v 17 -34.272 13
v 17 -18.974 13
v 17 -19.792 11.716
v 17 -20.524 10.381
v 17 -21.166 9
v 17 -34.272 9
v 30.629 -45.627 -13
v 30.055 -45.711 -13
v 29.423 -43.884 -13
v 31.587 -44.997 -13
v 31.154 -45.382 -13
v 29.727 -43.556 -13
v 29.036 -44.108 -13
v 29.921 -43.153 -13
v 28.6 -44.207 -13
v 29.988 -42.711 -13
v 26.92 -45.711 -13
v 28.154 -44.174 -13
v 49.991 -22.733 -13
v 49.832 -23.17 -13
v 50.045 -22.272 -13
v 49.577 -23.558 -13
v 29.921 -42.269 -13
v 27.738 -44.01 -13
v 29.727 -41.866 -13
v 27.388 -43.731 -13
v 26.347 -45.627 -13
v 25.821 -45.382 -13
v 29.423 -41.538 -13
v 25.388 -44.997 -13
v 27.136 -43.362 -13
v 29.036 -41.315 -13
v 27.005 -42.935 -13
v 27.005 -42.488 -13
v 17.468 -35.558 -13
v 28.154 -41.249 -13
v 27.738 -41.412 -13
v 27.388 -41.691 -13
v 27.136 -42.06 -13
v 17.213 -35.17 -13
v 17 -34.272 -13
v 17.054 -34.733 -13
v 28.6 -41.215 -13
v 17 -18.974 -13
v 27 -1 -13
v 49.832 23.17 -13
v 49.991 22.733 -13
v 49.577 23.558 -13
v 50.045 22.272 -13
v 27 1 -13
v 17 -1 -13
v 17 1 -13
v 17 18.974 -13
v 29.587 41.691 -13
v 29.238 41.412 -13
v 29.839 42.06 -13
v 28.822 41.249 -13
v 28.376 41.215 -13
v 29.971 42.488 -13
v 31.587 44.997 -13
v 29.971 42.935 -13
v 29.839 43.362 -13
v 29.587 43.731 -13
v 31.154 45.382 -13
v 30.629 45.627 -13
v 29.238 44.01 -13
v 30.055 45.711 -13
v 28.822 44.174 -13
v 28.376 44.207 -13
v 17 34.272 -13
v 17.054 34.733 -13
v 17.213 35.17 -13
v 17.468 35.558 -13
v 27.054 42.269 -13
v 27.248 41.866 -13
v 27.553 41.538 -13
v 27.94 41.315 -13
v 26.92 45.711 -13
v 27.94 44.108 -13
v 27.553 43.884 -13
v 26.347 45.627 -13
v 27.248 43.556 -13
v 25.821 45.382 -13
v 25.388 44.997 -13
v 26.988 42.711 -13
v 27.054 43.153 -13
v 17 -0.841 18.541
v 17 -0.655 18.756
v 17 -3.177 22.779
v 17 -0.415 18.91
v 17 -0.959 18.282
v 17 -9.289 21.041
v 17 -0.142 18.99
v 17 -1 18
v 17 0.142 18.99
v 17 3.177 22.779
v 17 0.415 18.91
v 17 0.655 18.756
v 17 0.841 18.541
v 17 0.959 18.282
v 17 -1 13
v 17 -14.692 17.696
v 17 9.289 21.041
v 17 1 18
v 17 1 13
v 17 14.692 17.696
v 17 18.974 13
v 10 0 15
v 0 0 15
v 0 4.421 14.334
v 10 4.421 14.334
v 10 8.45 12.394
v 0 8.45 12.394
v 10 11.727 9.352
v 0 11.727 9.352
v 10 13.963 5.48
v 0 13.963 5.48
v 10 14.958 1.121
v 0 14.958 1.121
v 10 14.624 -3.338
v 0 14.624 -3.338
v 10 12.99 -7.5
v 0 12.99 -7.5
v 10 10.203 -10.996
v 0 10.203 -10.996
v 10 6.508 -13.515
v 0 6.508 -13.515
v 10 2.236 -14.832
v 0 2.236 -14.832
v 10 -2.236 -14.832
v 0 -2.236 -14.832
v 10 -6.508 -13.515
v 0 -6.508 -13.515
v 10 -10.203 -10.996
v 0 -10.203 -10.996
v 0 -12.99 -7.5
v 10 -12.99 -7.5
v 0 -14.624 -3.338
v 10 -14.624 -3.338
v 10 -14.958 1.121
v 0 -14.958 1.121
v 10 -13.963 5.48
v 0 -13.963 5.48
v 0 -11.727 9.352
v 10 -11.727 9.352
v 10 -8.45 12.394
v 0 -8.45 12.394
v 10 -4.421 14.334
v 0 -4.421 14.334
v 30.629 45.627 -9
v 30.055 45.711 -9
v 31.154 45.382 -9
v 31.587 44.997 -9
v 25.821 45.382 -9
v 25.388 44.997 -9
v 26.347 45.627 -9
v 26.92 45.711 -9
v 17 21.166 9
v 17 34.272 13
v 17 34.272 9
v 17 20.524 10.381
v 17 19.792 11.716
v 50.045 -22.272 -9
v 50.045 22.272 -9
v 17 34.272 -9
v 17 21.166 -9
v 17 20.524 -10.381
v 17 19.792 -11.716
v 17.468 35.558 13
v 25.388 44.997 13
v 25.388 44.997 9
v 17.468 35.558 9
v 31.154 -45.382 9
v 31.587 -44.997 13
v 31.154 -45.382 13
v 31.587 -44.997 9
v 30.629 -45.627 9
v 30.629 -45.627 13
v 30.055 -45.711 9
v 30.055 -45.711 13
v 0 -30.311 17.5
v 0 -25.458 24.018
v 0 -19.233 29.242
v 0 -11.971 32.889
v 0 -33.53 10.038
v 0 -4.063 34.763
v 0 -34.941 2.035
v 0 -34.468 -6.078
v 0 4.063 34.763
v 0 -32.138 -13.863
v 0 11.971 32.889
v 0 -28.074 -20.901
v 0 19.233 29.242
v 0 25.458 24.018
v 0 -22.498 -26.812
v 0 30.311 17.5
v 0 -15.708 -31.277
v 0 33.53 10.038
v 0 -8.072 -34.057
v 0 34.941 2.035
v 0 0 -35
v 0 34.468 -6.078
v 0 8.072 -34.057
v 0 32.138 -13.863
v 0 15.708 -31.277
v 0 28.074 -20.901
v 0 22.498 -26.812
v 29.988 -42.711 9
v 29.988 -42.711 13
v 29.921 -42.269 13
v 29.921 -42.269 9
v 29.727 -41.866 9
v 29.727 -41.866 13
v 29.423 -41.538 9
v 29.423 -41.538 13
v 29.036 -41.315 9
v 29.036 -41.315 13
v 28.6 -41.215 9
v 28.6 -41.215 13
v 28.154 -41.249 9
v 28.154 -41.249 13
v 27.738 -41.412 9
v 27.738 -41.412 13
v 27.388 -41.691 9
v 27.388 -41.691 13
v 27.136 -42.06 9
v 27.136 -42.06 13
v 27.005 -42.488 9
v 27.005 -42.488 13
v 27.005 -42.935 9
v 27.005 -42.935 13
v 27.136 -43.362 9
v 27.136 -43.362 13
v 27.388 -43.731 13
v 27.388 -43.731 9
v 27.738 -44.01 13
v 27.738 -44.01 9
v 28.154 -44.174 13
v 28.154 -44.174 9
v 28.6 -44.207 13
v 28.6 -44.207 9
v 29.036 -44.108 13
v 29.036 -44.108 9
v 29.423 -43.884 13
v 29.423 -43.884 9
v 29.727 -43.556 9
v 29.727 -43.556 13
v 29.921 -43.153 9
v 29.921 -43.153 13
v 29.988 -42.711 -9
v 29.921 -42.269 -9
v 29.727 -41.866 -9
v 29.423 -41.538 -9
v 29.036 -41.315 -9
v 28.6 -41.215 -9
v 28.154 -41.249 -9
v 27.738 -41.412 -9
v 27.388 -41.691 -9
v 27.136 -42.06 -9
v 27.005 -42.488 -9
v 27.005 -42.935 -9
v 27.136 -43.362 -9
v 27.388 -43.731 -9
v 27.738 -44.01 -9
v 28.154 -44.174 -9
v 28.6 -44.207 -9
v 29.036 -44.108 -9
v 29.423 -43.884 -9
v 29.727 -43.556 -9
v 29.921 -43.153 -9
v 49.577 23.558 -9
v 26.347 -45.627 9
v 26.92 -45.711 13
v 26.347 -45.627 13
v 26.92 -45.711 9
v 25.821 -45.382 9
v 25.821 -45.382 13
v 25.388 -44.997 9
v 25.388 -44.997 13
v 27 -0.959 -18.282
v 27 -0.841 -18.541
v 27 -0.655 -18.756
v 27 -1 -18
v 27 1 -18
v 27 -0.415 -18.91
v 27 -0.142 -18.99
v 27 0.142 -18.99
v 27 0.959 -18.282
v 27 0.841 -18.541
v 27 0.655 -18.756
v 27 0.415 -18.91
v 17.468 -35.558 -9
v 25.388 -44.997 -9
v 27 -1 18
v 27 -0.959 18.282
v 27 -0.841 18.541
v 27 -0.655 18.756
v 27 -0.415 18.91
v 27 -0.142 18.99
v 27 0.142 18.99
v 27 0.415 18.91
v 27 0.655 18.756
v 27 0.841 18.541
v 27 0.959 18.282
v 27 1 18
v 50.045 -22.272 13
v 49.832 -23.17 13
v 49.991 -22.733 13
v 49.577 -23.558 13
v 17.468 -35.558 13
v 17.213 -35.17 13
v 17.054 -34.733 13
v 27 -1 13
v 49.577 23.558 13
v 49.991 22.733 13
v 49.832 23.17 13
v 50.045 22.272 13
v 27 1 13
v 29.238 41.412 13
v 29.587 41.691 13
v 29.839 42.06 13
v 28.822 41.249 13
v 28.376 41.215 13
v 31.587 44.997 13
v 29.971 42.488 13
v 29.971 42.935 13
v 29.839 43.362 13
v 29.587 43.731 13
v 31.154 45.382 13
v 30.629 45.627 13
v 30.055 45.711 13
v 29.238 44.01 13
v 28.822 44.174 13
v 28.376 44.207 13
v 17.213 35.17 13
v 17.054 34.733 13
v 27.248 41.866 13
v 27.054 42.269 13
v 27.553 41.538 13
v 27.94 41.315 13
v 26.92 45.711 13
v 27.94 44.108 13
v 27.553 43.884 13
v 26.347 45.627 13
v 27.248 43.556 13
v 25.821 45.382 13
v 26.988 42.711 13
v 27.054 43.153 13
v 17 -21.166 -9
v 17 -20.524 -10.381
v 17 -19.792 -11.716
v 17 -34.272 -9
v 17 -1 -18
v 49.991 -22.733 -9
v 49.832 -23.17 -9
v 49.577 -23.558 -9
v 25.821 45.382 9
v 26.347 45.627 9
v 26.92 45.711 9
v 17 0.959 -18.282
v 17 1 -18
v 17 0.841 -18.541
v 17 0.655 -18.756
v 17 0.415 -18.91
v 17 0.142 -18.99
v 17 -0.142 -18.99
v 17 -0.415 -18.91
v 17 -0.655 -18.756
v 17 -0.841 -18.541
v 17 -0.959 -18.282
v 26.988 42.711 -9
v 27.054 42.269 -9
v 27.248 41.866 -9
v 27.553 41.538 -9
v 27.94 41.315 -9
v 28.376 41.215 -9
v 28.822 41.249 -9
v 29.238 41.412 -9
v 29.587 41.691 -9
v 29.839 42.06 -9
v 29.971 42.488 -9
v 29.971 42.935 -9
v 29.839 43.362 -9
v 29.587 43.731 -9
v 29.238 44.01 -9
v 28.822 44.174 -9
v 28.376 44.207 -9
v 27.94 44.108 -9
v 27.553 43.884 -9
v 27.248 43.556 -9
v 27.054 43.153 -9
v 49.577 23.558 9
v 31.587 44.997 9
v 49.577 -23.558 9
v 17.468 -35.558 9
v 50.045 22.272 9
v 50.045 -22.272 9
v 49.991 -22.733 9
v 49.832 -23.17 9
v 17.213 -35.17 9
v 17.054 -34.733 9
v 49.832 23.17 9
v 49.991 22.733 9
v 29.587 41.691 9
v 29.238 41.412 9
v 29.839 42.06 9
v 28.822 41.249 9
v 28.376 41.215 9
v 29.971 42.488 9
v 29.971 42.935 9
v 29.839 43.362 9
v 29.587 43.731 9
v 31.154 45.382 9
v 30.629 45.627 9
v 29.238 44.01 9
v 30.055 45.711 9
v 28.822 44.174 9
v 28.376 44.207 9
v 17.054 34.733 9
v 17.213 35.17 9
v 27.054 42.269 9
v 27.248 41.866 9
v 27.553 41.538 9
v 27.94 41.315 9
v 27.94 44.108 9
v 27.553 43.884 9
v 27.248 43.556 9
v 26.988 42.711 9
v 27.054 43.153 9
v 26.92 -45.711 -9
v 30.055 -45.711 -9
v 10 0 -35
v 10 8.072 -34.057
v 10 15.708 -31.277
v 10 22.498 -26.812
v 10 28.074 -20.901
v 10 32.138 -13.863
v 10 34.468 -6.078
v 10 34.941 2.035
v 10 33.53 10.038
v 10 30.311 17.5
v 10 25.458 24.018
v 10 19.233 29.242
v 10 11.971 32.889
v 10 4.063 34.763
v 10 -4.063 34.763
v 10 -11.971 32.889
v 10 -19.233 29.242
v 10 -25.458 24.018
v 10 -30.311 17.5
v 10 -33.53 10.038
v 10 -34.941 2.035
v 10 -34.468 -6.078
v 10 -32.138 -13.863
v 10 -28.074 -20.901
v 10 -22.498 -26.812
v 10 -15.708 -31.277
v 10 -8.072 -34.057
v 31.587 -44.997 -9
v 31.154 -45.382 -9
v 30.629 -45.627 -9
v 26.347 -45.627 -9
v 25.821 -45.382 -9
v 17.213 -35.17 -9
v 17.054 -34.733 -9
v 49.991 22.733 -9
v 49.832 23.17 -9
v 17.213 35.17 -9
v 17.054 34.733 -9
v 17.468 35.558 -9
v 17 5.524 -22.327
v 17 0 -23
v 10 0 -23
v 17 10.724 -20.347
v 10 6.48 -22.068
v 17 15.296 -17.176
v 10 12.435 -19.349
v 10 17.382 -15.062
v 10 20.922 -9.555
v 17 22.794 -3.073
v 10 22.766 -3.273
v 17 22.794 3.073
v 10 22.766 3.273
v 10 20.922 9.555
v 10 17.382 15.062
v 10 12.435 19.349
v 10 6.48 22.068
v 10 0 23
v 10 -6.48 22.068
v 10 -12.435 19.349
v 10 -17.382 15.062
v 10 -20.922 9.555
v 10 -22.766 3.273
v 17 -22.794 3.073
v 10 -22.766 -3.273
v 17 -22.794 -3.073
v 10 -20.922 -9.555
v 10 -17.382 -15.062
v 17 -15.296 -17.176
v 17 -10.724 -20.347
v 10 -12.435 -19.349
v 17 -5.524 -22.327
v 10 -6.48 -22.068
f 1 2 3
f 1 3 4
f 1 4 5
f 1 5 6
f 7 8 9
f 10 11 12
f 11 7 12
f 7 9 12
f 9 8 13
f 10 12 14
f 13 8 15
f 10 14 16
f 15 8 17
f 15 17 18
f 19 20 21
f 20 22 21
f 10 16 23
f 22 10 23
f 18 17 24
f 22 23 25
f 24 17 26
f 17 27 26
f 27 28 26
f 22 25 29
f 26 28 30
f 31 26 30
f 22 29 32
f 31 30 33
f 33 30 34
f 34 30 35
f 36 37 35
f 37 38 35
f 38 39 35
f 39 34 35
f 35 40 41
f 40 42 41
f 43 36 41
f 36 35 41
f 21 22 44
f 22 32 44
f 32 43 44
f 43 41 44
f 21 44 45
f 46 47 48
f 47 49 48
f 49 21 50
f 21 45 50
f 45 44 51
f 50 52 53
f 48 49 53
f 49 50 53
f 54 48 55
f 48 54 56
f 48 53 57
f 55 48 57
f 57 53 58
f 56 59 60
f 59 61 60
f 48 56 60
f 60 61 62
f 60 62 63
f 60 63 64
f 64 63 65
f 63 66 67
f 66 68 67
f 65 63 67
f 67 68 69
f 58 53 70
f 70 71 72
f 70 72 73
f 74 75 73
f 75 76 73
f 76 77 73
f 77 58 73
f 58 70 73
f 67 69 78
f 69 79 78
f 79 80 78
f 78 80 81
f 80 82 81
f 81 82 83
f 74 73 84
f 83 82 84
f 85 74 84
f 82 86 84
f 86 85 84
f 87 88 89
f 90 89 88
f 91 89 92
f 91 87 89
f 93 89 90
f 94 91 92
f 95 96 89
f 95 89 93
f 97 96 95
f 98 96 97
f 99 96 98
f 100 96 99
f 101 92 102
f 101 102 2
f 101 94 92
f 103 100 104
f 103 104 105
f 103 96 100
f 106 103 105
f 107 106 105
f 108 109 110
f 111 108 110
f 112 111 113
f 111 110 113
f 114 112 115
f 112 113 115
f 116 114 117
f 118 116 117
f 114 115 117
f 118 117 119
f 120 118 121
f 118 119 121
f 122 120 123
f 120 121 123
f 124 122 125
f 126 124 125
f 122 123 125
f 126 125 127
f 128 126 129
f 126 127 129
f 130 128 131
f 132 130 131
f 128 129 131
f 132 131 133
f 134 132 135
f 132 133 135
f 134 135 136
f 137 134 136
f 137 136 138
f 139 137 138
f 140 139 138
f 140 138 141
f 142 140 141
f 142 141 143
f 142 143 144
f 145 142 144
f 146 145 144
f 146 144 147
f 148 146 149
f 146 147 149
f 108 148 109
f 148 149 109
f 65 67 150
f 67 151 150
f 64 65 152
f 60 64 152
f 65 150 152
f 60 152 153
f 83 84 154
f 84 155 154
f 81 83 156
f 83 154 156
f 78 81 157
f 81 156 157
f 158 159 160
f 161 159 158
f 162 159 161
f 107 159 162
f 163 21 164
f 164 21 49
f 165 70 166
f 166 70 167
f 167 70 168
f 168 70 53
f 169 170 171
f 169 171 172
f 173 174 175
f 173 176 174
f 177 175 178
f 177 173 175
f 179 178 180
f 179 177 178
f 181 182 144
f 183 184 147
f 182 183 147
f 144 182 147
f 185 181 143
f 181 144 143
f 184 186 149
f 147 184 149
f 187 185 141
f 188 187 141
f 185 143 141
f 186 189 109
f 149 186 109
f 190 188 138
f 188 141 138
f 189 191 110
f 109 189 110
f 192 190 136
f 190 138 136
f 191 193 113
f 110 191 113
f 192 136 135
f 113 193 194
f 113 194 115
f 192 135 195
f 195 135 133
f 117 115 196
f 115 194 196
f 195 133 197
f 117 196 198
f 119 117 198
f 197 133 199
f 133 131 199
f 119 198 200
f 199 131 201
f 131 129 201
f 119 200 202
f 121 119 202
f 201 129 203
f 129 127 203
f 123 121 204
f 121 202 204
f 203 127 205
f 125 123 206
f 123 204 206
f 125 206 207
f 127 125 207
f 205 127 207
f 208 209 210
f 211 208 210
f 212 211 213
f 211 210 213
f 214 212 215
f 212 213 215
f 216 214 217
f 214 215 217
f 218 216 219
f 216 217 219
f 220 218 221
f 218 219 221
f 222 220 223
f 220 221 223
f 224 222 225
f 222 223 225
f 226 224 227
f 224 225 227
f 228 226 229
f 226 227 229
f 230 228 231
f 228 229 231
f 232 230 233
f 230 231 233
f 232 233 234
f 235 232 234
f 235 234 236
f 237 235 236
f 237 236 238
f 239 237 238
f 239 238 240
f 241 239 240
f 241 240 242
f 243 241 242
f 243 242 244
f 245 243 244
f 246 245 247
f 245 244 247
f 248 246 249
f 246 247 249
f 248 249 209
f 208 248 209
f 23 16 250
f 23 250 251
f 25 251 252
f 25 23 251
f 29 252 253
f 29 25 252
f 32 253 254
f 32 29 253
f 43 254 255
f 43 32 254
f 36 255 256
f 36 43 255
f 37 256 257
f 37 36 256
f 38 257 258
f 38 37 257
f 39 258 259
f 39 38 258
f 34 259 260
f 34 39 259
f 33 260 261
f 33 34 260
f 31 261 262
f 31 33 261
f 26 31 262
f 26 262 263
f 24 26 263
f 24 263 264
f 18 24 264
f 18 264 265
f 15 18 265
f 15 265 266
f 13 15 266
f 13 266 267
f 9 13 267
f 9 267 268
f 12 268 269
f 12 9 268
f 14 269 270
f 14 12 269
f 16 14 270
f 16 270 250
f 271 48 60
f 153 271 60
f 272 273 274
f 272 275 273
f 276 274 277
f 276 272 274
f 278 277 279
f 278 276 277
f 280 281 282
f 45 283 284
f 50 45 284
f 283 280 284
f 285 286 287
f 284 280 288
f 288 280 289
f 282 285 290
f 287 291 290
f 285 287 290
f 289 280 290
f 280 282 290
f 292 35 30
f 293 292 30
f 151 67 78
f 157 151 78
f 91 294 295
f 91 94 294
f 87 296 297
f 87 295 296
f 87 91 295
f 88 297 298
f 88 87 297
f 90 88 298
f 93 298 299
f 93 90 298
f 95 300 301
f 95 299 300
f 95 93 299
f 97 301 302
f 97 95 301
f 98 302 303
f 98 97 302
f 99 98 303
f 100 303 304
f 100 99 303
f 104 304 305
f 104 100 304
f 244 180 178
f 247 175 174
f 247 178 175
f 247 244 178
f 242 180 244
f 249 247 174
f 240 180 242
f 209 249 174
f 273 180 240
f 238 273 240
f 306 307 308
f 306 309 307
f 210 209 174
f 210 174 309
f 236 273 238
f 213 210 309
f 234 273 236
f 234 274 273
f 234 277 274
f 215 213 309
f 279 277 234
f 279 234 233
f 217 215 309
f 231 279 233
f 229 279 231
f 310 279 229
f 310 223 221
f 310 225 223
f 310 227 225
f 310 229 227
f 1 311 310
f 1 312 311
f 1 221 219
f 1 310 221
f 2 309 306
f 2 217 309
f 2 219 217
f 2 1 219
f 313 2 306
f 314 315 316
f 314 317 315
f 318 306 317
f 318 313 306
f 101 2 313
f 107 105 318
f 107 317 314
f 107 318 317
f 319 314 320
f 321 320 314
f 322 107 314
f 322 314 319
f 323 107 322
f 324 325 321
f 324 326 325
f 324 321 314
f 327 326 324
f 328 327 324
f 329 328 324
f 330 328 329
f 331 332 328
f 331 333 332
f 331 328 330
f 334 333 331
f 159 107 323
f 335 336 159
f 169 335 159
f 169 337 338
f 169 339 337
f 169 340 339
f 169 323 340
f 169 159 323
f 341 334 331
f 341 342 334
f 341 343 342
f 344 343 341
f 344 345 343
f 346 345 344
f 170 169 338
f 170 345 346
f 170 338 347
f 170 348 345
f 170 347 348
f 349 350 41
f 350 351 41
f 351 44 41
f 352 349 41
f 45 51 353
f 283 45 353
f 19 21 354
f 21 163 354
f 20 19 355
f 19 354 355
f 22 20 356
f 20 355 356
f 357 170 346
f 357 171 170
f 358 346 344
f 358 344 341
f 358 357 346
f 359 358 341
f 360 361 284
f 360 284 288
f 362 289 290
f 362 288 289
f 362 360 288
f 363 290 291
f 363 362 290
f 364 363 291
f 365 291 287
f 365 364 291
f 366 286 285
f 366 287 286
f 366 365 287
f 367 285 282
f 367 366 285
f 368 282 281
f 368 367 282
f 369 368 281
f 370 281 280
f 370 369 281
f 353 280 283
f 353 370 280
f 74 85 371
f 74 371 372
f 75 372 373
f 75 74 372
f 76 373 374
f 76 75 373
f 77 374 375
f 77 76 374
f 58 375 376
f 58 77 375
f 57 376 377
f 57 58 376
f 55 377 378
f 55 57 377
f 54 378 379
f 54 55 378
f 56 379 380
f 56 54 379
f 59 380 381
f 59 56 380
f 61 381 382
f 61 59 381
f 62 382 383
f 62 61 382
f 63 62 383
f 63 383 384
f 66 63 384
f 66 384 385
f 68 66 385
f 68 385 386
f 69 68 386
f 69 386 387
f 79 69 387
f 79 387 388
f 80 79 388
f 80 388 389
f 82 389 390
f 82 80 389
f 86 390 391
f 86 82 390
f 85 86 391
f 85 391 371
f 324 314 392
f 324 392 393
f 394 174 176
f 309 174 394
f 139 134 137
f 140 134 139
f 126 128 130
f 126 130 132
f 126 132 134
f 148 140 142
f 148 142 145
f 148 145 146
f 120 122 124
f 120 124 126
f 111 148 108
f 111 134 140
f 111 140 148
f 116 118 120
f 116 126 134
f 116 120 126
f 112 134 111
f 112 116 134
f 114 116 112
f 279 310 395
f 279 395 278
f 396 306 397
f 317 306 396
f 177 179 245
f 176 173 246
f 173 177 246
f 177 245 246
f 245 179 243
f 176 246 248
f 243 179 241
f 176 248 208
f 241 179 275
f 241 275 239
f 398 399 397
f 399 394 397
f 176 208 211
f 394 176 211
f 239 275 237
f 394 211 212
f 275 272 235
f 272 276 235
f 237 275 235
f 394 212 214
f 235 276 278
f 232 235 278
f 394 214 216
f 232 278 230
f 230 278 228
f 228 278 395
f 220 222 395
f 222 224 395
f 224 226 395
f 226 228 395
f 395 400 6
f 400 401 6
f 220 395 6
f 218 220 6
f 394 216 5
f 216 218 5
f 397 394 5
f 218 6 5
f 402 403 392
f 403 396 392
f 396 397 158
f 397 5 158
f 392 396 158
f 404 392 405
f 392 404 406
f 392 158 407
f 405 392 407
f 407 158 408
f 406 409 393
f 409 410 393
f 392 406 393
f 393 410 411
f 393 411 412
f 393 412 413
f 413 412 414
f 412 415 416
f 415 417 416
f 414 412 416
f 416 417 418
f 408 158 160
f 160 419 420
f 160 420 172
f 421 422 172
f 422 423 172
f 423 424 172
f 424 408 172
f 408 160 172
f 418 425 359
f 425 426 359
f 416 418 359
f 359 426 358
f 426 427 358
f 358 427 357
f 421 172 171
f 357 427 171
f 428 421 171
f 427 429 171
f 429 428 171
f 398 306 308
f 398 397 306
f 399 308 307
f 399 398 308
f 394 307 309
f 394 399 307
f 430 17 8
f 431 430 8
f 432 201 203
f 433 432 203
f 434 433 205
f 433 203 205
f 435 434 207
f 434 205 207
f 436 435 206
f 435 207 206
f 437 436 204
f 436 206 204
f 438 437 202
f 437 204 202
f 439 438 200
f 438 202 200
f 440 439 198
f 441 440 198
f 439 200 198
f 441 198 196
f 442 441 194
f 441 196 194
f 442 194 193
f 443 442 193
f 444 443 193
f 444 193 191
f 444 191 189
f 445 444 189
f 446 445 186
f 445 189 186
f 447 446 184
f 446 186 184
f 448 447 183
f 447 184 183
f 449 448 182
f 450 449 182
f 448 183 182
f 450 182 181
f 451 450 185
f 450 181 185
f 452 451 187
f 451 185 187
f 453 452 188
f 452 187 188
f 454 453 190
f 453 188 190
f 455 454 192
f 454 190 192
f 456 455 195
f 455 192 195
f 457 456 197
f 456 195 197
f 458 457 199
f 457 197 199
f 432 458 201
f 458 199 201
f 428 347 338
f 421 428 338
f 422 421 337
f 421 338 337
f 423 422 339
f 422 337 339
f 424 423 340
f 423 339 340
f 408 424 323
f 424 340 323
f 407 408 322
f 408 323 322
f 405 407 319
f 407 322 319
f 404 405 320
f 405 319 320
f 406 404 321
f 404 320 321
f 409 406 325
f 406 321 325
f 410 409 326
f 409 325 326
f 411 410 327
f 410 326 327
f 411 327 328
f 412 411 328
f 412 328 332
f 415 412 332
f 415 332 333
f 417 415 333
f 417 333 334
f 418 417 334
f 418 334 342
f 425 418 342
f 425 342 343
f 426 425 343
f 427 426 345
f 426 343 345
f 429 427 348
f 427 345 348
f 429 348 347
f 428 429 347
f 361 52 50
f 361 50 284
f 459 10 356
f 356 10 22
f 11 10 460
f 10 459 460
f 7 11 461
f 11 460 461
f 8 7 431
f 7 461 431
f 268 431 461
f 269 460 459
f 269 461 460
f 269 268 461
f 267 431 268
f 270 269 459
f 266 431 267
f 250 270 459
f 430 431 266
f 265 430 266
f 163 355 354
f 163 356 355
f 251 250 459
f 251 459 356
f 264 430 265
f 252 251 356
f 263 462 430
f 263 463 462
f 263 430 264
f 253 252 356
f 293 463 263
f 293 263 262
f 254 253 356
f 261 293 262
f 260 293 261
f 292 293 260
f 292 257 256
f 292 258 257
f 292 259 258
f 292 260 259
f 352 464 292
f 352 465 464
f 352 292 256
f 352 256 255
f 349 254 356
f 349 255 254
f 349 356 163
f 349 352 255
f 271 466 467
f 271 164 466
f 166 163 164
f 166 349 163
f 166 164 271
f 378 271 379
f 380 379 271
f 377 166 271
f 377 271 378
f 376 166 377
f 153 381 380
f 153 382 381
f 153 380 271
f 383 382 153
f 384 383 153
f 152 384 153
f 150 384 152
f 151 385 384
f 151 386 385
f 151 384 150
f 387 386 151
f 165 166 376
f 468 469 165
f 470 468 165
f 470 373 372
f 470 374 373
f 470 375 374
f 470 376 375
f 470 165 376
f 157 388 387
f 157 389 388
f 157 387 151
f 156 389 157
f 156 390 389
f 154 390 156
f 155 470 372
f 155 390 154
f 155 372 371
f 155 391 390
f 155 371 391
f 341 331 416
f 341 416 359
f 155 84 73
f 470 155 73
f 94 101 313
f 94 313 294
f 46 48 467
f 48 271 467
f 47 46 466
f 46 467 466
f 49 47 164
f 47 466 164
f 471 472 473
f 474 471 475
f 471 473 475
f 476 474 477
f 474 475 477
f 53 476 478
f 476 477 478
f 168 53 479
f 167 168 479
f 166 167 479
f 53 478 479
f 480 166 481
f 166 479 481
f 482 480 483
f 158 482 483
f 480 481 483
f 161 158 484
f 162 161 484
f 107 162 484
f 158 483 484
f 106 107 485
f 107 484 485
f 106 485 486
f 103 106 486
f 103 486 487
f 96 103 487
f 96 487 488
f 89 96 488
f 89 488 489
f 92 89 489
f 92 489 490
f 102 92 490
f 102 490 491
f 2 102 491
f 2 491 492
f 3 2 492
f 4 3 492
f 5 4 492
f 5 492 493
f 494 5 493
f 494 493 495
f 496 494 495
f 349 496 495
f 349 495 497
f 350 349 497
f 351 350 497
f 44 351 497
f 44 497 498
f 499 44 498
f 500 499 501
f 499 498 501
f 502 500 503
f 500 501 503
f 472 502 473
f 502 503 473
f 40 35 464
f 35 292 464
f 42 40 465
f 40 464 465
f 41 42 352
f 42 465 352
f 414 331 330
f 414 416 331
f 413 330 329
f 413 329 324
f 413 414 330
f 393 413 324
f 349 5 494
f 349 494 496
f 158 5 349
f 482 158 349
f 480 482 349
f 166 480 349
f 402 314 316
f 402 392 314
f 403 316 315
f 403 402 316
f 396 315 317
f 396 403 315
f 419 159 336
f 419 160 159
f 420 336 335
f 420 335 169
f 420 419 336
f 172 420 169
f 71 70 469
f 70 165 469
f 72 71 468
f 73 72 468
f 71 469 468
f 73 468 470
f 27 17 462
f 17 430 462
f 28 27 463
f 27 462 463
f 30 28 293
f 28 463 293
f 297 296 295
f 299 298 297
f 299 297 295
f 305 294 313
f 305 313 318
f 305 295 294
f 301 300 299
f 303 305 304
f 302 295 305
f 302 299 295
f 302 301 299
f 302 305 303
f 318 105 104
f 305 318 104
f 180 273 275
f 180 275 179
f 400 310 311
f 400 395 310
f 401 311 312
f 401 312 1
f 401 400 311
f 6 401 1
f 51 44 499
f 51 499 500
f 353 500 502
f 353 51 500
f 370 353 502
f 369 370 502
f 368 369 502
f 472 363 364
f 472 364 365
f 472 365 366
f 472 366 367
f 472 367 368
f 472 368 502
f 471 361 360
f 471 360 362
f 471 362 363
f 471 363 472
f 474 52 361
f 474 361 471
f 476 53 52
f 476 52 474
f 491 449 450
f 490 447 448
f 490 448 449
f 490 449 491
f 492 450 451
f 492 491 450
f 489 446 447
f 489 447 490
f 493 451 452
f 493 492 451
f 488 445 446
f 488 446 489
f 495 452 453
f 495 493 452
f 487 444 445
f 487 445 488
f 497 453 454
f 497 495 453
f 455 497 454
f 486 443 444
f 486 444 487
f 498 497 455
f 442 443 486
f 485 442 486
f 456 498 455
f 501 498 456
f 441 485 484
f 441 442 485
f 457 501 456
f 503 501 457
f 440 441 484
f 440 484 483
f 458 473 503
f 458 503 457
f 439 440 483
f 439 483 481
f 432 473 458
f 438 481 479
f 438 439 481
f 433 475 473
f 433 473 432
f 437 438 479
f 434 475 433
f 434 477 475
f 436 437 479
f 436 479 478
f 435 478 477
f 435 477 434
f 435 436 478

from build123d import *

# Parameters (mm, degrees)
SKETCH1_R                   = 35
BOSS_EXTRUDE1_DEPTH         = 10
SKETCH2_R                   = 23
BOSS_EXTRUDE2_DEPTH         = 7
BOSS_EXTRUDE3_DEPTH         = 4
SKETCH4_R                   = 1.5
CUT_EXTRUDE2_DEPTH          = 4
SKETCH5_W                   = 2
SKETCH5_H                   = 6
BOSS_EXTRUDE4_DEPTH         = 10
FILLET1_RADIUS              = 1
FILLET1_LENGTH              = 10
FILLET2_R                   = 2
FILLET1_OF_MIRROR2_2_RADIUS = 1
FILLET1_OF_MIRROR2_2_LENGTH = 10
FILLET2_OF_MIRROR2_R        = 2
SKETCH6_R                   = 15
CUT_EXTRUDE3_DEPTH          = 10


with BuildPart() as part:
    # Sketch1 → Boss-Extrude1 (new body)
    with BuildSketch(Plane.YZ):
        with Locations(Location((0, 0, 0), (0, 0, 270))):
            Circle(SKETCH1_R)
    extrude(amount=BOSS_EXTRUDE1_DEPTH)

    # Sketch2 → Boss-Extrude2 (add)
    with BuildSketch(Plane.YZ.offset(10)):
        with Locations(Location((0, 0, 0), (0, 0, 270))):
            Circle(SKETCH2_R)
    extrude(amount=BOSS_EXTRUDE2_DEPTH)

    # Sketch3 → Boss-Extrude3 (add)
    with BuildSketch(Plane(origin=(0, 0, 13), x_dir=(0, 1, 0), z_dir=(0, 0, 1))):
        Polygon((35, -17), (-35, -17), (-45.711191774, -25.987757067), (-45.711191774, -30.987757067), (-23, -50.044709708), (23, -50.044709708), (45.711191774, -30.987757067), (45.711191774, -25.987757067), align=None)
    boss_extrude3 = extrude(amount=-BOSS_EXTRUDE3_DEPTH)

    # Sketch4 → Cut-Extrude2 (cut)
    with BuildSketch(Plane.XY.offset(13)):
        with Locations((28.487757067, -42.711191774)):
            Circle(SKETCH4_R)
        with Locations(Location((28.487757067, 42.711191774, 0), (0, 0, 180))):
            Circle(SKETCH4_R)
    cut_extrude2 = extrude(amount=-CUT_EXTRUDE2_DEPTH, mode=Mode.SUBTRACT)

    # Sketch5 → Boss-Extrude4 (add)
    with BuildSketch(Plane.YZ.offset(17)):
        with Locations((0, 16)):
            Rectangle(SKETCH5_W, SKETCH5_H)
    boss_extrude4 = extrude(amount=BOSS_EXTRUDE4_DEPTH)

    # Fillet1: full round fillet: the end face becomes a half cylinder, R = half its width
    fillet1_face = Plane((22, 0, 19), x_dir=(-1, 0, 0), z_dir=(0, 0, 1))  # on the end face: x along it, z out of the body
    fillet1_slab = fillet1_face.offset(-FILLET1_RADIUS / 2) * Box(FILLET1_LENGTH, 2 * FILLET1_RADIUS, FILLET1_RADIUS, mode=Mode.PRIVATE)  # the body's end, R deep
    fillet1_round = Plane((22, 0, 18), x_dir=(0, 0, 1), z_dir=(-1, 0, 0)) * Cylinder(FILLET1_RADIUS, FILLET1_LENGTH, mode=Mode.PRIVATE)  # its axis R under the face
    add(fillet1_slab - fillet1_round, mode=Mode.SUBTRACT)

    # Fillet2
    fillet2_edges = [part.edges().sort_by_distance(p)[0] for p in [
        (50.044709708, 23, 11),
        (50.044709708, -23, 11),
        (30.987757067, -45.711191774, 11),
        (25.987757067, -45.711191774, 11),
        (17, -35, 11),
        (17, 35, 11),
        (25.987757067, 45.711191774, 11),
        (30.987757067, 45.711191774, 11),
    ]]
    fillet(fillet2_edges, radius=FILLET2_R)

    # Mirror2: Boss-Extrude3, Cut-Extrude2, Boss-Extrude4 across plane
    add(boss_extrude3.mirror(Plane.XY))
    add(cut_extrude2.mirror(Plane.XY), mode=Mode.SUBTRACT)
    add(boss_extrude4.mirror(Plane.XY))

    # Fillet1 of Mirror2 2: full round fillet: the end face becomes a half cylinder, R = half its width
    fillet1_of_mirror2_2_face = Plane((22, 0, -19), x_dir=(-1, 0, 0), z_dir=(0, 0, -1))  # on the end face: x along it, z out of the body
    fillet1_of_mirror2_2_slab = fillet1_of_mirror2_2_face.offset(-FILLET1_OF_MIRROR2_2_RADIUS / 2) * Box(FILLET1_OF_MIRROR2_2_LENGTH, 2 * FILLET1_OF_MIRROR2_2_RADIUS, FILLET1_OF_MIRROR2_2_RADIUS, mode=Mode.PRIVATE)  # the body's end, R deep
    fillet1_of_mirror2_2_round = Plane((22, 0, -18), x_dir=(0, 0, -1), z_dir=(-1, 0, 0)) * Cylinder(FILLET1_OF_MIRROR2_2_RADIUS, FILLET1_OF_MIRROR2_2_LENGTH, mode=Mode.PRIVATE)  # its axis R under the face
    add(fillet1_of_mirror2_2_slab - fillet1_of_mirror2_2_round, mode=Mode.SUBTRACT)

    # Fillet2 of Mirror2
    fillet2_of_mirror2_edges = [part.edges().sort_by_distance(p)[0] for p in [
        (50.044709708, 23, -11),
        (50.044709708, -23, -11),
        (30.987757067, -45.711191774, -11),
        (25.987757067, -45.711191774, -11),
        (17, -35, -11),
        (17, 35, -11),
        (25.987757067, 45.711191774, -11),
        (30.987757067, 45.711191774, -11),
    ]]
    fillet(fillet2_of_mirror2_edges, radius=FILLET2_OF_MIRROR2_R)

    # Sketch6 → Cut-Extrude3 (cut)
    with BuildSketch(Plane(origin=(0, 0, 0), x_dir=(0, -1, 0), z_dir=(-1, 0, 0))):
        with Locations(Location((0, 0, 0), (0, 0, 90))):
            Circle(SKETCH6_R)
    extrude(amount=-CUT_EXTRUDE3_DEPTH, mode=Mode.SUBTRACT)


solid = part.part
